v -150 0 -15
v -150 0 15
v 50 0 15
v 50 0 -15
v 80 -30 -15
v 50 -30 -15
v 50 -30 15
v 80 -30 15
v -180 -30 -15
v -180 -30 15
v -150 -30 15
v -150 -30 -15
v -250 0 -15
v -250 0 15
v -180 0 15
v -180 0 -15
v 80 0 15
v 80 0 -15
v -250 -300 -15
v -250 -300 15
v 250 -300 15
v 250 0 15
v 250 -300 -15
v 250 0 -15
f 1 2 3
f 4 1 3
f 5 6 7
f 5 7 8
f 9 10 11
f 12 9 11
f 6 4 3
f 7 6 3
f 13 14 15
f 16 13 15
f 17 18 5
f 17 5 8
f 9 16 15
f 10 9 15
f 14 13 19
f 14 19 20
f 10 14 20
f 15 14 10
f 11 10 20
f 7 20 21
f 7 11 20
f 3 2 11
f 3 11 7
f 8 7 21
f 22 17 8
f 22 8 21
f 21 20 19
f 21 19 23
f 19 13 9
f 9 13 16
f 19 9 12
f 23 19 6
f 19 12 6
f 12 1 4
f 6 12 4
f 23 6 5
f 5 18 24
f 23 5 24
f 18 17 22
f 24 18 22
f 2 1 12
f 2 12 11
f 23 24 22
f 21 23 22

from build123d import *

# Parameters (mm, degrees)
F0_W     = 500
F0_H     = 30
F1_DEPTH = 300
F2_W     = 30
F2_H     = 30.000001
F3_DEPTH = 30
F4_W     = 30
F4_H     = 30
F5_DEPTH = 30


with BuildPart() as f1:
    # F0 (on Front) → F1 (new body)
    with BuildSketch(Plane.XZ):
        Rectangle(F0_W, F0_H)
    extrude(amount=F1_DEPTH)

    # F2 (on Front) → F3 (cut)
    with BuildSketch(Plane.XZ):
        with Locations((65, 0)):
            Rectangle(F2_W, F2_H)
    extrude(amount=F3_DEPTH, mode=Mode.SUBTRACT)

    # F4 (on Front) → F5 (cut)
    with BuildSketch(Plane.XZ):
        with Locations((-165, 0)):
            Rectangle(F4_W, F4_H)
    extrude(amount=F5_DEPTH, mode=Mode.SUBTRACT)


solid = f1.part
